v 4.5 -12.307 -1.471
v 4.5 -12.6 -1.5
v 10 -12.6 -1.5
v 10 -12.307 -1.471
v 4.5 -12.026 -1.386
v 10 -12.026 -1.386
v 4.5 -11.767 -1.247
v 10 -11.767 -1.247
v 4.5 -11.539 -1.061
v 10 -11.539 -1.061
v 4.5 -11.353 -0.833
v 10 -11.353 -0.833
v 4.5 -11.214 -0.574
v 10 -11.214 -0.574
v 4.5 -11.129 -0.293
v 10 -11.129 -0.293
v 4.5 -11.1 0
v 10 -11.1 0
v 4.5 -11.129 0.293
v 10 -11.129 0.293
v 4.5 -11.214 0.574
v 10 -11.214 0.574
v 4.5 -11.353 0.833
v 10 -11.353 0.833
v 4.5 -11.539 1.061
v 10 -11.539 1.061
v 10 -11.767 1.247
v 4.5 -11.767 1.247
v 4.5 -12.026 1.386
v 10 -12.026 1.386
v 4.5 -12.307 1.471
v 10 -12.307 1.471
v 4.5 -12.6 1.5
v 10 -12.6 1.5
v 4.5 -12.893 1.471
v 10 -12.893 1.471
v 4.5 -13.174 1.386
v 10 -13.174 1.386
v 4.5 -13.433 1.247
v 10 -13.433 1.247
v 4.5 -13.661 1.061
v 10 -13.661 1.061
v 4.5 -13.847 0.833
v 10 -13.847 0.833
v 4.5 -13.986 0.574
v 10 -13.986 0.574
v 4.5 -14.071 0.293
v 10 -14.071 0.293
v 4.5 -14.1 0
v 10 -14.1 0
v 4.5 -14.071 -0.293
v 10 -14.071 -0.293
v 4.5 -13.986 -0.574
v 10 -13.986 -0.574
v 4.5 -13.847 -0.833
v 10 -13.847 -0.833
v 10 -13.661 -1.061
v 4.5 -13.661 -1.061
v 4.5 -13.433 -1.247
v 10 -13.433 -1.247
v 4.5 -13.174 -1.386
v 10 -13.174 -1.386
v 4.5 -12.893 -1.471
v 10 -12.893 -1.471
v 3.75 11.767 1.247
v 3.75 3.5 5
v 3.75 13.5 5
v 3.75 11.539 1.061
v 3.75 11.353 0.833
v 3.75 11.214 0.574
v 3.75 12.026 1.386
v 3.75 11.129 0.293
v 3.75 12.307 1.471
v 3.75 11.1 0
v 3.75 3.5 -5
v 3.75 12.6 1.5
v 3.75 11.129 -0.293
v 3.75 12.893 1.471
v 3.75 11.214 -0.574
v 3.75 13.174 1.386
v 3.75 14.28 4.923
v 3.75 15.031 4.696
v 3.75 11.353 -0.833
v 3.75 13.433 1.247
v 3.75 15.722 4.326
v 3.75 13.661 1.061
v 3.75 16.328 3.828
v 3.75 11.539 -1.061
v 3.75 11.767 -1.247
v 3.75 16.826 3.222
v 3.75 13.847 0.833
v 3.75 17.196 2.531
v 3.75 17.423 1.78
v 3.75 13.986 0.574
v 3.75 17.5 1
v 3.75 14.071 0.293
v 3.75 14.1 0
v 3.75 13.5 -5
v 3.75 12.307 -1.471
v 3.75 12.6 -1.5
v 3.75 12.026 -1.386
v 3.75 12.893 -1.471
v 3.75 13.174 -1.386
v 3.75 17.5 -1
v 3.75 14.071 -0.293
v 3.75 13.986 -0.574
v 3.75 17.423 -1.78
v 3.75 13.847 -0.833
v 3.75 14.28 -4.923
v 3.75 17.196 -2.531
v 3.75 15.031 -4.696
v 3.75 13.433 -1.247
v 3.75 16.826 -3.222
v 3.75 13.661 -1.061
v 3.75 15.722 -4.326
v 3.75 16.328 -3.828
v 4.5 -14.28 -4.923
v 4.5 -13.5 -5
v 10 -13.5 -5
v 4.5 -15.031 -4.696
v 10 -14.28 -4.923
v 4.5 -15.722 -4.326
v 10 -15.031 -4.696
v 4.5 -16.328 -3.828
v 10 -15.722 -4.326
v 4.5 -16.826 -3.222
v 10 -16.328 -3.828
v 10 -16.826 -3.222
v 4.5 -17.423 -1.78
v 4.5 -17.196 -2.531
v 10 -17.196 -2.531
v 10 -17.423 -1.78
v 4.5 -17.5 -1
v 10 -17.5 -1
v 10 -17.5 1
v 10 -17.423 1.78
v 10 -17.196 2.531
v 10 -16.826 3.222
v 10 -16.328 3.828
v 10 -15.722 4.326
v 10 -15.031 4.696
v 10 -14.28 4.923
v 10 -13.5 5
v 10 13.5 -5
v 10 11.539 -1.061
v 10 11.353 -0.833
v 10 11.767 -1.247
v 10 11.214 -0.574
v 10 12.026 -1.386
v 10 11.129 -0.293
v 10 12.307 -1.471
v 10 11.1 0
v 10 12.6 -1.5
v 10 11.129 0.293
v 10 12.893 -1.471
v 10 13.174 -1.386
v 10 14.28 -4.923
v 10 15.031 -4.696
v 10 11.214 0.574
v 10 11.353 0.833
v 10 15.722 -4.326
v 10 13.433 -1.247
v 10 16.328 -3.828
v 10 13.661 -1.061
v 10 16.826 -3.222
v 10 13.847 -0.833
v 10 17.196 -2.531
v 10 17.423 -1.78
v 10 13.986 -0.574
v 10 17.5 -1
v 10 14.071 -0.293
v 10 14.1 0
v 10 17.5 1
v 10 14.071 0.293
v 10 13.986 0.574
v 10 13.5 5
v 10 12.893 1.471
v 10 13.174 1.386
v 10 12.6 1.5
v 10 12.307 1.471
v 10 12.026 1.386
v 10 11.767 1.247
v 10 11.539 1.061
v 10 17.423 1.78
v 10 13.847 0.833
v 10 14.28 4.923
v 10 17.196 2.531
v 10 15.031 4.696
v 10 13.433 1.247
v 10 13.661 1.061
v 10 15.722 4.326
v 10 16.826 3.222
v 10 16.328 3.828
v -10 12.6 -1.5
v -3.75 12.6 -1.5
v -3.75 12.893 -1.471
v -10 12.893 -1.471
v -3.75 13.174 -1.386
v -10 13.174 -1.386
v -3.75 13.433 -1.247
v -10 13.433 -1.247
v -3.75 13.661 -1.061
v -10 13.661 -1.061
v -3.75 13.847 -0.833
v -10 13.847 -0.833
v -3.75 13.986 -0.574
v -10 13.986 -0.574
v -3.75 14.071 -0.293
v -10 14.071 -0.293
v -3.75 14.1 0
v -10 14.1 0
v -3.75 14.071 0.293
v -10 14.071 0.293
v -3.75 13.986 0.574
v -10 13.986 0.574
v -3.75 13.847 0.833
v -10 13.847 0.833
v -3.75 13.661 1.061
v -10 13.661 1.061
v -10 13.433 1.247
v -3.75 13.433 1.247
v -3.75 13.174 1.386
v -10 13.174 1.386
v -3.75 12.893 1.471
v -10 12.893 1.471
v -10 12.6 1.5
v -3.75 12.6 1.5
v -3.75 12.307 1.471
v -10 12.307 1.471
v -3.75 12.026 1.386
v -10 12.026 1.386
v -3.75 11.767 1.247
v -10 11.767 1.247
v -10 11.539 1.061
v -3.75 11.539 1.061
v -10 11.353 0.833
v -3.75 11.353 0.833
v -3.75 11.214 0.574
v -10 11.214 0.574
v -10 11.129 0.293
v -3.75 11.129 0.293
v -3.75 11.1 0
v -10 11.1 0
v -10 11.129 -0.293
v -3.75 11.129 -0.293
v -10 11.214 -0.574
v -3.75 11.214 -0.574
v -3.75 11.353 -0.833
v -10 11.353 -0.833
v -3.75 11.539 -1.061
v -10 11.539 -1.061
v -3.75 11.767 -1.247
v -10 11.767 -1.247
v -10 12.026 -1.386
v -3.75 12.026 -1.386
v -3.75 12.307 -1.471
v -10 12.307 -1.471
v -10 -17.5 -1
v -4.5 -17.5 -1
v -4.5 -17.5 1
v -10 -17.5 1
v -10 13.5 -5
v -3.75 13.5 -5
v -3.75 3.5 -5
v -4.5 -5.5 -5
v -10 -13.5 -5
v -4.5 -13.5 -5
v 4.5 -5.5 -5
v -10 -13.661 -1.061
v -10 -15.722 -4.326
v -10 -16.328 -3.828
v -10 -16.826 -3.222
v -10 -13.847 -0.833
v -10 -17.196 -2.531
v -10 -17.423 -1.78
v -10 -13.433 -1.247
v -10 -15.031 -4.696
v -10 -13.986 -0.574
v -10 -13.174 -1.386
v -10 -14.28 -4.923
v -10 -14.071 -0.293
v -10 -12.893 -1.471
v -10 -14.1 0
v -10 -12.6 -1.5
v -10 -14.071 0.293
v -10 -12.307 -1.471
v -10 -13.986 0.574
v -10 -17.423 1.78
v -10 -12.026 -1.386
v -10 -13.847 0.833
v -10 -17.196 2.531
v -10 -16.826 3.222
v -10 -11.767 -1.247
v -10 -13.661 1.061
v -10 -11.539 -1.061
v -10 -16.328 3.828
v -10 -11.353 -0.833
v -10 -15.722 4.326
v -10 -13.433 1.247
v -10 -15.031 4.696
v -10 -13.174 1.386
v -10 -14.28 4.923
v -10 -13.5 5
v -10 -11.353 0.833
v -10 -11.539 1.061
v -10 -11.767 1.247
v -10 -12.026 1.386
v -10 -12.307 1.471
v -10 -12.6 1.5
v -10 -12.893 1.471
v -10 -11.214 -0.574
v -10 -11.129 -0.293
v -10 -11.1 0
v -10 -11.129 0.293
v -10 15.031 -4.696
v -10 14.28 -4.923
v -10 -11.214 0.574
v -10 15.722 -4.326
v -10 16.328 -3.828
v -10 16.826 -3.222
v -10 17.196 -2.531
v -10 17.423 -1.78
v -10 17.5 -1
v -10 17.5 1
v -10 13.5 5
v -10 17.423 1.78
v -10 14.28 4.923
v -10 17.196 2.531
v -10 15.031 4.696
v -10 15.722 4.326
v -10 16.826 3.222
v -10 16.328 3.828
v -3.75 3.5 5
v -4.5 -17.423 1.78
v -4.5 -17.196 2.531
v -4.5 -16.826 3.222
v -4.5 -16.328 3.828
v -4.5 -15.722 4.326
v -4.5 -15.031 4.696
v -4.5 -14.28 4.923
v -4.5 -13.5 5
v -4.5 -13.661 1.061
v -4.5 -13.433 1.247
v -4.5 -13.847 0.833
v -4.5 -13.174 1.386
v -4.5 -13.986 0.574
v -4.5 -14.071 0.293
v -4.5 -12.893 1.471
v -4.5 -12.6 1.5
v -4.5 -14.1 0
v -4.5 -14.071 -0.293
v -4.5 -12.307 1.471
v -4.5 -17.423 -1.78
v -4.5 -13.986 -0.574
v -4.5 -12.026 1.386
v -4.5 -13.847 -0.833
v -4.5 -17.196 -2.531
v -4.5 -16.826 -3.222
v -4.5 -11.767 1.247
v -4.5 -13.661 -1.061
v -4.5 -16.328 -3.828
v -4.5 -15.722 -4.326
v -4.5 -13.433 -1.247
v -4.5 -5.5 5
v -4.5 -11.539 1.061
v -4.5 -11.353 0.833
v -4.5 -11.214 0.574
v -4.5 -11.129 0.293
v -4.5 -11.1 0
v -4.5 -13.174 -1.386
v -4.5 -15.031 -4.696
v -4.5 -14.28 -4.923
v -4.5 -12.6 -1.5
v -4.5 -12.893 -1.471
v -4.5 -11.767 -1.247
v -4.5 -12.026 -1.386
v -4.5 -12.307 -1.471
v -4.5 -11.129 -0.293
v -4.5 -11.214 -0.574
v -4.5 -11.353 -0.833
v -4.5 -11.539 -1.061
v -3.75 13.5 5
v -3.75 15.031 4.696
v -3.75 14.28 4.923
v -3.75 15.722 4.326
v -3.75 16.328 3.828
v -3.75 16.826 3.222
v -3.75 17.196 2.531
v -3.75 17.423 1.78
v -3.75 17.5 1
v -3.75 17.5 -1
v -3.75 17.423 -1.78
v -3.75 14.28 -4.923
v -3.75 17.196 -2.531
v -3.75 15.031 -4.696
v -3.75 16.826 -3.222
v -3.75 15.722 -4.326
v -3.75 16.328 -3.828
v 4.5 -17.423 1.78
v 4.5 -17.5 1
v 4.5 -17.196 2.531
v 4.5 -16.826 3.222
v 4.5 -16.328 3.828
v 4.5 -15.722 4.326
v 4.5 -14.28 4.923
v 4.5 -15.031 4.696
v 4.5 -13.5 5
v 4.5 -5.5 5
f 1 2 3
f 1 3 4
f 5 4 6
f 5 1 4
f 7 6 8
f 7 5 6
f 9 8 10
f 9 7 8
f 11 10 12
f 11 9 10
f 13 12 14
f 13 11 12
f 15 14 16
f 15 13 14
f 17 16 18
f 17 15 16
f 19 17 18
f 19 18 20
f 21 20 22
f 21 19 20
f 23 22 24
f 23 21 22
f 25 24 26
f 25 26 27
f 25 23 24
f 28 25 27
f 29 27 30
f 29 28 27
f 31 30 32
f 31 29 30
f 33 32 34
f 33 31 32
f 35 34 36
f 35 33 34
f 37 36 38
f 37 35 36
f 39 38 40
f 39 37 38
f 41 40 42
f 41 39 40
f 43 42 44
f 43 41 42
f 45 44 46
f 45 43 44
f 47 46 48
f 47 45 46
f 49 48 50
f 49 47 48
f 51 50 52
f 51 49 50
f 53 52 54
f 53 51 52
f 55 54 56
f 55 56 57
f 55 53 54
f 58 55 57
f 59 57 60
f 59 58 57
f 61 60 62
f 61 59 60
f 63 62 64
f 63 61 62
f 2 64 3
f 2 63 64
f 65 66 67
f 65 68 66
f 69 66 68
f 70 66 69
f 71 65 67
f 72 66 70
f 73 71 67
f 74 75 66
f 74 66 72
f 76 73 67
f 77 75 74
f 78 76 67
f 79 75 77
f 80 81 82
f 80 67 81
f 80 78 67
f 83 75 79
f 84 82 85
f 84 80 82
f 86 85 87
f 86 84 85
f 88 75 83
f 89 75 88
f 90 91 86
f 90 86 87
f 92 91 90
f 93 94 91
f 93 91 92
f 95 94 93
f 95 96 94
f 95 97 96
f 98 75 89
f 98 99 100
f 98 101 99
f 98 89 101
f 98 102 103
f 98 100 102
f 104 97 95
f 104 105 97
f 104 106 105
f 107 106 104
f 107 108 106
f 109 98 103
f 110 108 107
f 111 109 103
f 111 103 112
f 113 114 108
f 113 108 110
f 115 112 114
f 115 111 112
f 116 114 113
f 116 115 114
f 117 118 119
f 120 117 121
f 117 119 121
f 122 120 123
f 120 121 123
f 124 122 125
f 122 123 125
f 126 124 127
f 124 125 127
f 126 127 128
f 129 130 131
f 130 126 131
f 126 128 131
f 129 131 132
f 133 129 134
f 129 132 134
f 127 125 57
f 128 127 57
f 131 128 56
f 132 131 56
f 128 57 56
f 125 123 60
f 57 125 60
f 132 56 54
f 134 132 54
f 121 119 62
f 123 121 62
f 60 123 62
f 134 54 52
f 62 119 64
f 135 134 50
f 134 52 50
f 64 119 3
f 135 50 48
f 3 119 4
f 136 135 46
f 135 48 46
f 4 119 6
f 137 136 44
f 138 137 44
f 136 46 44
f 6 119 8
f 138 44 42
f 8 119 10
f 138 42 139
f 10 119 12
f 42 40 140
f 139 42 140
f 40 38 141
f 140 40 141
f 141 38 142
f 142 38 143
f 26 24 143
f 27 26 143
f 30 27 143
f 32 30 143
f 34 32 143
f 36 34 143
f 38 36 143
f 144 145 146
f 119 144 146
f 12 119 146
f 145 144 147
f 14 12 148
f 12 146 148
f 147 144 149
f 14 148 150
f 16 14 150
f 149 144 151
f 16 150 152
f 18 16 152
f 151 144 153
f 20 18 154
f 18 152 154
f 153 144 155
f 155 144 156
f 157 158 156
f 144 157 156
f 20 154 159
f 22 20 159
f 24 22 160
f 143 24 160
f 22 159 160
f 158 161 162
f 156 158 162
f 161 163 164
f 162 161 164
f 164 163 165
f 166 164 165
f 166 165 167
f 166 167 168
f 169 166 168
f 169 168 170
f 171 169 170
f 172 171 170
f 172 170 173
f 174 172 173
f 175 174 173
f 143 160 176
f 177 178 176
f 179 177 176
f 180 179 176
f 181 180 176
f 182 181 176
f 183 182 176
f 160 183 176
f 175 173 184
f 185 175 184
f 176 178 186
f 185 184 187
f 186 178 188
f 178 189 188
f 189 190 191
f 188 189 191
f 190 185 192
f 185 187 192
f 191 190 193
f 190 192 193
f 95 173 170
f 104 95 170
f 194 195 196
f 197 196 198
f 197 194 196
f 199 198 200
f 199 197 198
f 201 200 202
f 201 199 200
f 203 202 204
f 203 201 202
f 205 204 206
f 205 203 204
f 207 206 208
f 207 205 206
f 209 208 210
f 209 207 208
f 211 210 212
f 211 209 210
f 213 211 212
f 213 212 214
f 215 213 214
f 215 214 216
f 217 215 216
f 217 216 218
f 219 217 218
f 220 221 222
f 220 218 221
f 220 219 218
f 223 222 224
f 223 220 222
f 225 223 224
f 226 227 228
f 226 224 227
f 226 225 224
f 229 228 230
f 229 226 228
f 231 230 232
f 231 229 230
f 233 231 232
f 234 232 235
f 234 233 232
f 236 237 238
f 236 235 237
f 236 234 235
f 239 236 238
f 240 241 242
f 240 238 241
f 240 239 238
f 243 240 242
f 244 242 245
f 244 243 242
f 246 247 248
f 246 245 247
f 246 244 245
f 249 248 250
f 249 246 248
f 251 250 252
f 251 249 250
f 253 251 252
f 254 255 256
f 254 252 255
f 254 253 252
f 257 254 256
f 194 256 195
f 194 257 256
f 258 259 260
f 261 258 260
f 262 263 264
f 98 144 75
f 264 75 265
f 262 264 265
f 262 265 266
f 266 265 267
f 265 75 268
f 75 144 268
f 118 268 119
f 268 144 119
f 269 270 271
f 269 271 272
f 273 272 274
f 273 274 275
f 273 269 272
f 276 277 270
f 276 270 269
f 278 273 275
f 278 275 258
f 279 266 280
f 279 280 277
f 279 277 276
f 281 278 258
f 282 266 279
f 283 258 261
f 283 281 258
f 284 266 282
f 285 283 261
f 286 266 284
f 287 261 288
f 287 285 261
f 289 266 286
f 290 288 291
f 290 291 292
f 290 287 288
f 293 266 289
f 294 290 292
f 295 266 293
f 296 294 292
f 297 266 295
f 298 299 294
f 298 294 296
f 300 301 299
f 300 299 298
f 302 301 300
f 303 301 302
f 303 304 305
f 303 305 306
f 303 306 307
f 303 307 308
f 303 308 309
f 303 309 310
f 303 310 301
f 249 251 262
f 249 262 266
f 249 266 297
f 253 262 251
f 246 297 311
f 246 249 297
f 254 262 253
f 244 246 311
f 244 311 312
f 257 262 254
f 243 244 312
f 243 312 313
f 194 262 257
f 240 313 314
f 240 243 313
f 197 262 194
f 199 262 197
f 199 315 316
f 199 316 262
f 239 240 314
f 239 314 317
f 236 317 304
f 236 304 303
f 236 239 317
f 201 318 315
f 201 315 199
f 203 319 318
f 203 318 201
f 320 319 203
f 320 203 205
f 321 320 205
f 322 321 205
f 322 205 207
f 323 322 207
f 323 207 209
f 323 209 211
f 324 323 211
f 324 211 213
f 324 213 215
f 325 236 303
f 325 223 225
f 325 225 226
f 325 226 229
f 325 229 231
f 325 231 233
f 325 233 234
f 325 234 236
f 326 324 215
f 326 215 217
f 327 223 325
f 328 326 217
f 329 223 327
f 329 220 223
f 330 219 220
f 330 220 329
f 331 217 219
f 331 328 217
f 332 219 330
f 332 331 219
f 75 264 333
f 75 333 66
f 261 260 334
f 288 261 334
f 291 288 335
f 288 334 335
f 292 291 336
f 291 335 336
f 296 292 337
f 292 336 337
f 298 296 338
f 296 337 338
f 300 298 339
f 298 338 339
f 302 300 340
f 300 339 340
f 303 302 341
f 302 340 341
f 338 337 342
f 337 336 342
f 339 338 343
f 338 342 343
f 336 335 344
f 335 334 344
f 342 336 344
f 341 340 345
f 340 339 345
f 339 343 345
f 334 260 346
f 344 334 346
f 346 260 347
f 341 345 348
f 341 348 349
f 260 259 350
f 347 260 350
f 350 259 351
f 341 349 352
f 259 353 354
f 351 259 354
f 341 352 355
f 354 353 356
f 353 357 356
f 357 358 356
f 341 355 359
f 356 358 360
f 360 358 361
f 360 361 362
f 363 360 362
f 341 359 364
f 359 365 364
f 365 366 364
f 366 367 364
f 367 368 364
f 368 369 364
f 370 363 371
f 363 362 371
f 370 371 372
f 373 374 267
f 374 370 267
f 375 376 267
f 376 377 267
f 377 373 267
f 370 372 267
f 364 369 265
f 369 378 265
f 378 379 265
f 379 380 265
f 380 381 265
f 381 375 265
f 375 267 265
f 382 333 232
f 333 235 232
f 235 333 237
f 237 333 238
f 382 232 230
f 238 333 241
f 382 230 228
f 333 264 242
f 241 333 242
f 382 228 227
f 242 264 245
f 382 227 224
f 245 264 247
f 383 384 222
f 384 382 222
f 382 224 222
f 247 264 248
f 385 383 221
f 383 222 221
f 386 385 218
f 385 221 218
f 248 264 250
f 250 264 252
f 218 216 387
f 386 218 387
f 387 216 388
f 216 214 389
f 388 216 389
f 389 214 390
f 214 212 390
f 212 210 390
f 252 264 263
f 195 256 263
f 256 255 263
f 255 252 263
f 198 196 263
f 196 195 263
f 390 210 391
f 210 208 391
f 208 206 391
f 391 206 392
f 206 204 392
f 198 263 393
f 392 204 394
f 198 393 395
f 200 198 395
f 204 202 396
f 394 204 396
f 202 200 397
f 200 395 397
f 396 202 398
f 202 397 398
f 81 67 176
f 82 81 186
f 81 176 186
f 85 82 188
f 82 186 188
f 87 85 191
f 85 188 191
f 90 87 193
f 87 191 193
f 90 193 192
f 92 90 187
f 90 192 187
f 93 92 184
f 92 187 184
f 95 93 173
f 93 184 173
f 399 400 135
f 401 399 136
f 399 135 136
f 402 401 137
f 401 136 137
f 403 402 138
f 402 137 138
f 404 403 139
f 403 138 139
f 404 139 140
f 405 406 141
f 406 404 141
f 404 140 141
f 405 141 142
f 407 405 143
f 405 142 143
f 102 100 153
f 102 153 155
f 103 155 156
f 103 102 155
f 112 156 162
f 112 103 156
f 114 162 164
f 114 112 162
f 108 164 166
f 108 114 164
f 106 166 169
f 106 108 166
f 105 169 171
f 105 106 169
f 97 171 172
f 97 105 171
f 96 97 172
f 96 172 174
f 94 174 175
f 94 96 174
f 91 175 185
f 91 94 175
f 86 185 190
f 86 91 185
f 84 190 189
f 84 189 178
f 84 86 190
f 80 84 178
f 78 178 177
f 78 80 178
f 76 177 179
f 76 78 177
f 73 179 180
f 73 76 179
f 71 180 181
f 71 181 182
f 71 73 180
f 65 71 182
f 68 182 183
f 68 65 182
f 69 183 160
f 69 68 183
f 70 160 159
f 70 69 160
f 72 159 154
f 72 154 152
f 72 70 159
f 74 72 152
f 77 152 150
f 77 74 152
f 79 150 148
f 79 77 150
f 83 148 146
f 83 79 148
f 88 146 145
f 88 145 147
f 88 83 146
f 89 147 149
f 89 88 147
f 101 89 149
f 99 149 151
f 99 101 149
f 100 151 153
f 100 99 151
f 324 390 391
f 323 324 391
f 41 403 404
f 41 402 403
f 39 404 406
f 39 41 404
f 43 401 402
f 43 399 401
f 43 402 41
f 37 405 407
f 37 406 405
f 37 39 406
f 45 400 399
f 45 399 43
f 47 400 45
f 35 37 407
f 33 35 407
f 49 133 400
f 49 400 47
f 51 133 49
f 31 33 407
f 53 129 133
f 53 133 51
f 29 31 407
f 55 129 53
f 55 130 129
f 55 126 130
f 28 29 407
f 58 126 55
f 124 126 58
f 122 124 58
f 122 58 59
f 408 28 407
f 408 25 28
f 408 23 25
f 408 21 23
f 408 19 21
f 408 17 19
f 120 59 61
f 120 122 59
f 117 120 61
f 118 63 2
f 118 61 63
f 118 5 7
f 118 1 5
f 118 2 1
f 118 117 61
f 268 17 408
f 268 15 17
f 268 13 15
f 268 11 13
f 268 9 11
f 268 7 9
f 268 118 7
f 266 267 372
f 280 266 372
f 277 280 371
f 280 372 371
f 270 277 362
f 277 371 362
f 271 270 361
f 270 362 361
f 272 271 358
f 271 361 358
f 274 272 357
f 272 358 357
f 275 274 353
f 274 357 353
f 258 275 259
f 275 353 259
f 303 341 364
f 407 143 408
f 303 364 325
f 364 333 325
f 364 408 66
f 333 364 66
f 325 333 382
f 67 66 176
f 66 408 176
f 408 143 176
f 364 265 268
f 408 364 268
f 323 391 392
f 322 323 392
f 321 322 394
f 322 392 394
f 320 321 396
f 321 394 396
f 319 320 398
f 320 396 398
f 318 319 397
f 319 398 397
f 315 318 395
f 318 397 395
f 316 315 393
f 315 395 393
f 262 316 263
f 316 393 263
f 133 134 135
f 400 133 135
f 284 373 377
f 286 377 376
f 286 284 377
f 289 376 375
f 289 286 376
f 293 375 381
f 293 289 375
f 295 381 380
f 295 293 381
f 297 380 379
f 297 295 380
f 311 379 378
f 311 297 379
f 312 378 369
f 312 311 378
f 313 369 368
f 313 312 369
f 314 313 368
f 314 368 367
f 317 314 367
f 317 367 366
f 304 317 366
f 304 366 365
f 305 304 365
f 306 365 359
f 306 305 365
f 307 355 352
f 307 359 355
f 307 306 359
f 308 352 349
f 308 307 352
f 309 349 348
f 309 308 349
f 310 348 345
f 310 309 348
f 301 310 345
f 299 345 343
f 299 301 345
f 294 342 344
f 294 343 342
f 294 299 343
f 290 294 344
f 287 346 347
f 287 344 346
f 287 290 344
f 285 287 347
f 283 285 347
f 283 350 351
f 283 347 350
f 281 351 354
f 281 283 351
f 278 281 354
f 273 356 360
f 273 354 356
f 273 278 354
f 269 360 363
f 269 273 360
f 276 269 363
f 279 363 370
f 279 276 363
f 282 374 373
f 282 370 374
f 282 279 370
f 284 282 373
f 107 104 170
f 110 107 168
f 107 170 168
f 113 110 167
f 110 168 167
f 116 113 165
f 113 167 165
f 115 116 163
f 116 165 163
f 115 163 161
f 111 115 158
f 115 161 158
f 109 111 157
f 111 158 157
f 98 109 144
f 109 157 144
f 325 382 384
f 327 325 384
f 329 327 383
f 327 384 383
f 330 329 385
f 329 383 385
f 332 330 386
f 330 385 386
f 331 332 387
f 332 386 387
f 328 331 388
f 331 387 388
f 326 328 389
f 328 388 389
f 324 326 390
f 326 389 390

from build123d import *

# Parameters (mm, degrees)
CROQUIS1_R                 = 1.5
SALIENTE_EXTRUIR1_DEPTH    = 10
CORTAR_EXTRUIR1_DEPTH      = 21.766559657
CORTAR_EXTRUIR1_DEPTH_BACK = 21.766559657
CROQUIS2_W                 = 9
CROQUIS2_H                 = 12
CROQUIS2_W_2               = 7.5
CROQUIS2_H_2               = 14


with BuildPart() as part:
    # Croquis1 → Saliente-Extruir1 (new, symmetric)
    with BuildSketch(Plane(origin=(0, 0, 0), x_dir=(0, 0, -1), z_dir=(1, 0, 0))):
        with BuildLine():
            Line((-1, 17.5), (1, 17.5))
            ThreePointArc((1, 17.5), (3.828427125, 16.328427125), (5, 13.5))
            Line((5, 13.5), (5, -13.5))
            ThreePointArc((5, -13.5), (3.828427125, -16.328427125), (1, -17.5))
            Line((1, -17.5), (-1, -17.5))
            ThreePointArc((-1, -17.5), (-3.828427125, -16.328427125), (-5, -13.5))
            Line((-5, -13.5), (-5, 13.5))
            ThreePointArc((-5, 13.5), (-3.828427125, 16.328427125), (-1, 17.5))
        make_face()
        with Locations((0, 12.6)):
            Circle(CROQUIS1_R, mode=Mode.SUBTRACT)
        with Locations((0, -12.6)):
            Circle(CROQUIS1_R, mode=Mode.SUBTRACT)
    extrude(amount=SALIENTE_EXTRUIR1_DEPTH, both=True)

    # Croquis2 → Cortar-Extruir1 (cut, two sides: drawn at the far end of the back side and taken through both)
    with BuildSketch(Plane.XY.offset(-CORTAR_EXTRUIR1_DEPTH_BACK)):
        with Locations((0, -11.5)):
            Rectangle(CROQUIS2_W, CROQUIS2_H)
        with Locations((0, 10.5)):
            Rectangle(CROQUIS2_W_2, CROQUIS2_H_2)
    extrude(amount=CORTAR_EXTRUIR1_DEPTH + CORTAR_EXTRUIR1_DEPTH_BACK, mode=Mode.SUBTRACT)


solid = part.part
